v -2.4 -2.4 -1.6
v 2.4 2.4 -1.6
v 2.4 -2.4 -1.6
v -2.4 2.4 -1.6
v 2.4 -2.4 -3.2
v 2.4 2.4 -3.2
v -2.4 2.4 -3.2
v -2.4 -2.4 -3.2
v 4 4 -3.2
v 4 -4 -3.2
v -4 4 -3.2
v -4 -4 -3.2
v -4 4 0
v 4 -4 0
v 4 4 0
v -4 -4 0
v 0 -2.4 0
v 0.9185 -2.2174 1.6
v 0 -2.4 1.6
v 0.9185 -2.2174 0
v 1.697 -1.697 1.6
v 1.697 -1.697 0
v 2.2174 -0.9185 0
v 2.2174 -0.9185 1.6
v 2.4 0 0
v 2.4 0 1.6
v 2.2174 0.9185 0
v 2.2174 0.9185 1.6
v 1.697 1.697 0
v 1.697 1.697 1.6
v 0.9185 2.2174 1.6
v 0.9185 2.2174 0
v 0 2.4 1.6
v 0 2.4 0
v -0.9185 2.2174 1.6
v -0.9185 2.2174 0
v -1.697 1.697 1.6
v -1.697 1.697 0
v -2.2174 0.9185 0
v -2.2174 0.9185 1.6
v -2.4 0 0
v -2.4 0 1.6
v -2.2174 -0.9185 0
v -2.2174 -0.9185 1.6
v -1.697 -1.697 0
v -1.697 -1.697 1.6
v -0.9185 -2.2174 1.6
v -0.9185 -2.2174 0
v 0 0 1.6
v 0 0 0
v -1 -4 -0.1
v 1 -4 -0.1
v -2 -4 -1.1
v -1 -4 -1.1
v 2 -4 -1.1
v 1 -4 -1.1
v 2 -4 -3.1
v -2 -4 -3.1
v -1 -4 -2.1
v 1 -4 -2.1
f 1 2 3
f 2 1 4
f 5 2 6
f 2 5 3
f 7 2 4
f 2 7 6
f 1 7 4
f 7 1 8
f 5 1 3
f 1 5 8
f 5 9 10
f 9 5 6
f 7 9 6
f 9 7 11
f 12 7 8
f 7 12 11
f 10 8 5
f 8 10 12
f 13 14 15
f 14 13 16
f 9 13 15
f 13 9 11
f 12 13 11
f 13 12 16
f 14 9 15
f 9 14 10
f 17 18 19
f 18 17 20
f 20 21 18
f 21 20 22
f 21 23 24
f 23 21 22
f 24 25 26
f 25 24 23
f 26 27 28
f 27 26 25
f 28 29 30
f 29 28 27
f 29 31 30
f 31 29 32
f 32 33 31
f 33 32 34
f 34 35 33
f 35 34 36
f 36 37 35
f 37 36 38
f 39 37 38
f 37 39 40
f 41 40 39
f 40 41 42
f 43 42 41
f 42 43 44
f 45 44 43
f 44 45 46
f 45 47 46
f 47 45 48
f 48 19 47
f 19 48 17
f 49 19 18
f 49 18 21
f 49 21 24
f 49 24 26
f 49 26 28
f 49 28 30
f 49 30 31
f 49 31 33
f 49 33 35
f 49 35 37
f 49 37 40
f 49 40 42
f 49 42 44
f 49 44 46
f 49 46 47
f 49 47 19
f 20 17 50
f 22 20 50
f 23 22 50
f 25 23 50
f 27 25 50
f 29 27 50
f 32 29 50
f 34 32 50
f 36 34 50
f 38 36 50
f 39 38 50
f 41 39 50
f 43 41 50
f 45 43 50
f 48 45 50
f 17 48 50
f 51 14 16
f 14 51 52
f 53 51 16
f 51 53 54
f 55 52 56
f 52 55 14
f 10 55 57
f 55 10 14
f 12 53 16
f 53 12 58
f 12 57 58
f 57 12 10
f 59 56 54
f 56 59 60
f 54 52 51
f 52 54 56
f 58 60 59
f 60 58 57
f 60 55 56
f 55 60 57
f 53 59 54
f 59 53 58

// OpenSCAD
// file: ../p/4-4edge.scad
use <../lib.scad>
function ldraw_lib__4_4edge() = [
// 0 Circle 1.0
// 0 Name: 4-4edge.dat
// 0 Author: James Jessiman
// 0 !LDRAW_ORG Primitive UPDATE 2017-01
// 0 !LICENSE Licensed under CC BY 2.0 and CC BY 4.0 : see CAreadme.txt
// 
// 0 BFC CERTIFY CCW
  [0,"BFC","CERTIFY"],
  [0,"BFC","CCW"],
// 
// 0 !HISTORY 1998-12-15 [PTadmin] Official Update 1998-10
// 0 !HISTORY 2005-12-28 [PTadmin] Official Update 2005-01
// 0 !HISTORY 2007-06-24 [PTadmin] Header formatted for Contributor Agreement
// 0 !HISTORY 2008-07-01 [PTadmin] Official Update 2008-01
// 0 !HISTORY 2017-01-15 [Steffen] BFCed
// 0 !HISTORY 2017-12-30 [PTadmin] Official Update 2017-01
// 
// 
// 2 24 1 0 0 0.9239 0 0.3827
  [2,24,1,0,0,0.9239,0,0.3827],
// 2 24 0.9239 0 0.3827 0.7071 0 0.7071
  [2,24,0.9239,0,0.3827,0.7071,0,0.7071],
// 2 24 0.7071 0 0.7071 0.3827 0 0.9239
  [2,24,0.7071,0,0.7071,0.3827,0,0.9239],
// 2 24 0.3827 0 0.9239 0 0 1
  [2,24,0.3827,0,0.9239,0,0,1],
// 2 24 0 0 1 -0.3827 0 0.9239
  [2,24,0,0,1,-0.3827,0,0.9239],
// 2 24 -0.3827 0 0.9239 -0.7071 0 0.7071
  [2,24,-0.3827,0,0.9239,-0.7071,0,0.7071],
// 2 24 -0.7071 0 0.7071 -0.9239 0 0.3827
  [2,24,-0.7071,0,0.7071,-0.9239,0,0.3827],
// 2 24 -0.9239 0 0.3827 -1 0 -0
  [2,24,-0.9239,0,0.3827,-1,0,-0],
// 2 24 -1 0 -0 -0.9239 0 -0.3827
  [2,24,-1,0,-0,-0.9239,0,-0.3827],
// 2 24 -0.9239 0 -0.3827 -0.7071 0 -0.7071
  [2,24,-0.9239,0,-0.3827,-0.7071,0,-0.7071],
// 2 24 -0.7071 0 -0.7071 -0.3827 0 -0.9239
  [2,24,-0.7071,0,-0.7071,-0.3827,0,-0.9239],
// 2 24 -0.3827 0 -0.9239 0 0 -1
  [2,24,-0.3827,0,-0.9239,0,0,-1],
// 2 24 0 0 -1 0.3827 0 -0.9239
  [2,24,0,0,-1,0.3827,0,-0.9239],
// 2 24 0.3827 0 -0.9239 0.7071 0 -0.7071
  [2,24,0.3827,0,-0.9239,0.7071,0,-0.7071],
// 2 24 0.7071 0 -0.7071 0.9239 0 -0.3827
  [2,24,0.7071,0,-0.7071,0.9239,0,-0.3827],
// 2 24 0.9239 0 -0.3827 1 0 0
  [2,24,0.9239,0,-0.3827,1,0,0],
];
module ldraw_lib__4_4edge(step=0, col=false, unit=2/5, alt=false, line=0.2, solid=!$preview)
    makepoly(ldraw_lib__4_4edge(), step=step, col=col, unit=unit, alt=alt, line=line, solid=solid);
ldraw_lib__4_4edge(line=0.2);
// file: ../p/4-4disc.scad
use <../lib.scad>
function ldraw_lib__4_4disc() = [
// 0 Disc 1.0
// 0 Name: 4-4disc.dat
// 0 Author: James Jessiman
// 0 !LDRAW_ORG Primitive UPDATE 2002-02
// 0 !LICENSE Licensed under CC BY 2.0 and CC BY 4.0 : see CAreadme.txt
// 
// 0 BFC CERTIFY CCW
  [0,"BFC","CERTIFY"],
  [0,"BFC","CCW"],
// 
// 0 !HISTORY 1998-12-15 [PTadmin] Official Update 1998-10
// 0 !HISTORY 2002-03-23 [sbliss] Added BFC statement
// 0 !HISTORY 2002-04-25 [PTadmin] Official Update 2002-02
// 0 !HISTORY 2007-06-24 [PTadmin] Header formatted for Contributor Agreement
// 0 !HISTORY 2008-07-01 [PTadmin] Official Update 2008-01
// 
// 
// 3 16 0 0 0 1 0 0 0.9239 0 0.3827
  [3,16,0,0,0,1,0,0,0.9239,0,0.3827],
// 3 16 0 0 0 0.9239 0 0.3827 0.7071 0 0.7071
  [3,16,0,0,0,0.9239,0,0.3827,0.7071,0,0.7071],
// 3 16 0 0 0 0.7071 0 0.7071 0.3827 0 0.9239
  [3,16,0,0,0,0.7071,0,0.7071,0.3827,0,0.9239],
// 3 16 0 0 0 0.3827 0 0.9239 0 0 1
  [3,16,0,0,0,0.3827,0,0.9239,0,0,1],
// 3 16 0 0 0 0 0 1 -0.3827 0 0.9239
  [3,16,0,0,0,0,0,1,-0.3827,0,0.9239],
// 3 16 0 0 0 -0.3827 0 0.9239 -0.7071 0 0.7071
  [3,16,0,0,0,-0.3827,0,0.9239,-0.7071,0,0.7071],
// 3 16 0 0 0 -0.7071 0 0.7071 -0.9239 0 0.3827
  [3,16,0,0,0,-0.7071,0,0.7071,-0.9239,0,0.3827],
// 3 16 0 0 0 -0.9239 0 0.3827 -1 0 -0
  [3,16,0,0,0,-0.9239,0,0.3827,-1,0,-0],
// 3 16 0 0 0 -1 0 -0 -0.9239 0 -0.3827
  [3,16,0,0,0,-1,0,-0,-0.9239,0,-0.3827],
// 3 16 0 0 0 -0.9239 0 -0.3827 -0.7071 0 -0.7071
  [3,16,0,0,0,-0.9239,0,-0.3827,-0.7071,0,-0.7071],
// 3 16 0 0 0 -0.7071 0 -0.7071 -0.3827 0 -0.9239
  [3,16,0,0,0,-0.7071,0,-0.7071,-0.3827,0,-0.9239],
// 3 16 0 0 0 -0.3827 0 -0.9239 0 0 -1
  [3,16,0,0,0,-0.3827,0,-0.9239,0,0,-1],
// 3 16 0 0 0 0 0 -1 0.3827 0 -0.9239
  [3,16,0,0,0,0,0,-1,0.3827,0,-0.9239],
// 3 16 0 0 0 0.3827 0 -0.9239 0.7071 0 -0.7071
  [3,16,0,0,0,0.3827,0,-0.9239,0.7071,0,-0.7071],
// 3 16 0 0 0 0.7071 0 -0.7071 0.9239 0 -0.3827
  [3,16,0,0,0,0.7071,0,-0.7071,0.9239,0,-0.3827],
// 3 16 0 0 0 0.9239 0 -0.3827 1 0 0
  [3,16,0,0,0,0.9239,0,-0.3827,1,0,0],
// 0
];
module ldraw_lib__4_4disc(step=0, col=false, unit=2/5, alt=false, line=0.2, solid=!$preview)
    makepoly(ldraw_lib__4_4disc(), step=step, col=col, unit=unit, alt=alt, line=line, solid=solid);
ldraw_lib__4_4disc(line=0.2);
// file: ../p/4-4cyli.scad
use <../lib.scad>
$fa=1; $fs=0.2;
function ldraw_lib__4_4cyli(realsolid=false) = [
// 0 Cylinder 1.0
// 0 Name: 4-4cyli.dat
// 0 Author: James Jessiman
// 0 !LDRAW_ORG Primitive UPDATE 2005-01
// 0 !LICENSE Licensed under CC BY 2.0 and CC BY 4.0 : see CAreadme.txt
// 
// 0 BFC CERTIFY CCW
  [0,"BFC","CERTIFY"],
  [0,"BFC","CCW"],
// 
// 0 !HISTORY 1998-12-15 [PTadmin] Official Update 1998-10
// 0 !HISTORY 2002-03-23 [sbliss] Added BFC statement; merged headers from files in distributions LDraw 0.27 and Complete.
// 0 !HISTORY 2002-04-25 [PTadmin] Official Update 2002-02
// 0 !HISTORY 2004-12-14 [guyvivan] BFC CCW
// 0 !HISTORY 2005-12-28 [PTadmin] Official Update 2005-01
// 0 !HISTORY 2007-06-24 [PTadmin] Header formatted for Contributor Agreement
// 0 !HISTORY 2008-07-01 [PTadmin] Official Update 2008-01
// 
// 
// 4 16 1 1 0 0.9239 1 0.3827 0.9239 0 0.3827 1 0 0
  [4,16,1,1,0,0.9239,1,0.3827,0.9239,0,0.3827,1,0,0],
// 5 24 1 0 0 1 1 0 0.9239 0 0.3827 0.9239 0 -0.3827
  [5,24,1,0,0,1,1,0,0.9239,0,0.3827,0.9239,0,-0.3827],
// 4 16 0.9239 1 0.3827 0.7071 1 0.7071 0.7071 0 0.7071 0.9239 0 0.3827
  [4,16,0.9239,1,0.3827,0.7071,1,0.7071,0.7071,0,0.7071,0.9239,0,0.3827],
// 5 24 0.9239 0 0.3827 0.9239 1 0.3827 0.7071 0 0.7071 1 0 0
  [5,24,0.9239,0,0.3827,0.9239,1,0.3827,0.7071,0,0.7071,1,0,0],
// 4 16 0.7071 1 0.7071 0.3827 1 0.9239 0.3827 0 0.9239 0.7071 0 0.7071
  [4,16,0.7071,1,0.7071,0.3827,1,0.9239,0.3827,0,0.9239,0.7071,0,0.7071],
// 5 24 0.7071 0 0.7071 0.7071 1 0.7071 0.3827 0 0.9239 0.9239 0 0.3827
  [5,24,0.7071,0,0.7071,0.7071,1,0.7071,0.3827,0,0.9239,0.9239,0,0.3827],
// 4 16 0.3827 1 0.9239 0 1 1 0 0 1 0.3827 0 0.9239
  [4,16,0.3827,1,0.9239,0,1,1,0,0,1,0.3827,0,0.9239],
// 5 24 0.3827 0 0.9239 0.3827 1 0.9239 0 0 1 0.7071 0 0.7071
  [5,24,0.3827,0,0.9239,0.3827,1,0.9239,0,0,1,0.7071,0,0.7071],
// 4 16 0 1 1 -0.3827 1 0.9239 -0.3827 0 0.9239 0 0 1
  [4,16,0,1,1,-0.3827,1,0.9239,-0.3827,0,0.9239,0,0,1],
// 5 24 0 0 1 0 1 1 -0.3827 0 0.9239 0.3827 0 0.9239
  [5,24,0,0,1,0,1,1,-0.3827,0,0.9239,0.3827,0,0.9239],
// 4 16 -0.3827 1 0.9239 -0.7071 1 0.7071 -0.7071 0 0.7071 -0.3827 0 0.9239
  [4,16,-0.3827,1,0.9239,-0.7071,1,0.7071,-0.7071,0,0.7071,-0.3827,0,0.9239],
// 5 24 -0.3827 0 0.9239 -0.3827 1 0.9239 -0.7071 0 0.7071 0 0 1
  [5,24,-0.3827,0,0.9239,-0.3827,1,0.9239,-0.7071,0,0.7071,0,0,1],
// 4 16 -0.7071 1 0.7071 -0.9239 1 0.3827 -0.9239 0 0.3827 -0.7071 0 0.7071
  [4,16,-0.7071,1,0.7071,-0.9239,1,0.3827,-0.9239,0,0.3827,-0.7071,0,0.7071],
// 5 24 -0.7071 0 0.7071 -0.7071 1 0.7071 -0.9239 0 0.3827 -0.3827 0 0.9239
  [5,24,-0.7071,0,0.7071,-0.7071,1,0.7071,-0.9239,0,0.3827,-0.3827,0,0.9239],
// 4 16 -0.9239 1 0.3827 -1 1 0 -1 0 0 -0.9239 0 0.3827
  [4,16,-0.9239,1,0.3827,-1,1,0,-1,0,0,-0.9239,0,0.3827],
// 5 24 -0.9239 0 0.3827 -0.9239 1 0.3827 -1 0 0 -0.7071 0 0.7071
  [5,24,-0.9239,0,0.3827,-0.9239,1,0.3827,-1,0,0,-0.7071,0,0.7071],
// 4 16 -1 1 0 -0.9239 1 -0.3827 -0.9239 0 -0.3827 -1 0 0
  [4,16,-1,1,0,-0.9239,1,-0.3827,-0.9239,0,-0.3827,-1,0,0],
// 5 24 -1 0 0 -1 1 0 -0.9239 0 -0.3827 -0.9239 0 0.3827
  [5,24,-1,0,0,-1,1,0,-0.9239,0,-0.3827,-0.9239,0,0.3827],
// 4 16 -0.9239 1 -0.3827 -0.7071 1 -0.7071 -0.7071 0 -0.7071 -0.9239 0 -0.3827
  [4,16,-0.9239,1,-0.3827,-0.7071,1,-0.7071,-0.7071,0,-0.7071,-0.9239,0,-0.3827],
// 5 24 -0.9239 0 -0.3827 -0.9239 1 -0.3827 -0.7071 0 -0.7071 -1 0 0
  [5,24,-0.9239,0,-0.3827,-0.9239,1,-0.3827,-0.7071,0,-0.7071,-1,0,0],
// 4 16 -0.7071 1 -0.7071 -0.3827 1 -0.9239 -0.3827 0 -0.9239 -0.7071 0 -0.7071
  [4,16,-0.7071,1,-0.7071,-0.3827,1,-0.9239,-0.3827,0,-0.9239,-0.7071,0,-0.7071],
// 5 24 -0.7071 0 -0.7071 -0.7071 1 -0.7071 -0.3827 0 -0.9239 -0.9239 0 -0.3827
  [5,24,-0.7071,0,-0.7071,-0.7071,1,-0.7071,-0.3827,0,-0.9239,-0.9239,0,-0.3827],
// 4 16 -0.3827 1 -0.9239 0 1 -1 0 0 -1 -0.3827 0 -0.9239
  [4,16,-0.3827,1,-0.9239,0,1,-1,0,0,-1,-0.3827,0,-0.9239],
// 5 24 -0.3827 0 -0.9239 -0.3827 1 -0.9239 0 0 -1 -0.7071 0 -0.7071
  [5,24,-0.3827,0,-0.9239,-0.3827,1,-0.9239,0,0,-1,-0.7071,0,-0.7071],
// 4 16 0 1 -1 0.3827 1 -0.9239 0.3827 0 -0.9239 0 0 -1
  [4,16,0,1,-1,0.3827,1,-0.9239,0.3827,0,-0.9239,0,0,-1],
// 5 24 0 0 -1 0 1 -1 0.3827 0 -0.9239 -0.3827 0 -0.9239
  [5,24,0,0,-1,0,1,-1,0.3827,0,-0.9239,-0.3827,0,-0.9239],
// 4 16 0.3827 1 -0.9239 0.7071 1 -0.7071 0.7071 0 -0.7071 0.3827 0 -0.9239
  [4,16,0.3827,1,-0.9239,0.7071,1,-0.7071,0.7071,0,-0.7071,0.3827,0,-0.9239],
// 5 24 0.3827 0 -0.9239 0.3827 1 -0.9239 0.7071 0 -0.7071 0 0 -1
  [5,24,0.3827,0,-0.9239,0.3827,1,-0.9239,0.7071,0,-0.7071,0,0,-1],
// 4 16 0.7071 1 -0.7071 0.9239 1 -0.3827 0.9239 0 -0.3827 0.7071 0 -0.7071
  [4,16,0.7071,1,-0.7071,0.9239,1,-0.3827,0.9239,0,-0.3827,0.7071,0,-0.7071],
// 5 24 0.7071 0 -0.7071 0.7071 1 -0.7071 0.9239 0 -0.3827 0.3827 0 -0.9239
  [5,24,0.7071,0,-0.7071,0.7071,1,-0.7071,0.9239,0,-0.3827,0.3827,0,-0.9239],
// 4 16 0.9239 1 -0.3827 1 1 0 1 0 0 0.9239 0 -0.3827
  [4,16,0.9239,1,-0.3827,1,1,0,1,0,0,0.9239,0,-0.3827],
// 5 24 0.9239 0 -0.3827 0.9239 1 -0.3827 1 0 0 0.7071 0 -0.7071
  [5,24,0.9239,0,-0.3827,0.9239,1,-0.3827,1,0,0,0.7071,0,-0.7071],
// 0
];
module ldraw_lib__4_4cyli(step=0, col=false, unit=2/5, alt=false, line=0.2, solid=!$preview)
    makepoly(ldraw_lib__4_4cyli(solid), step=step, col=col, unit=unit, alt=alt, line=line, solid=solid);
ldraw_lib__4_4cyli(line=0.2);
// file: ../p/stud.scad
use <../lib.scad>
use <4-4cyli.scad>
use <4-4disc.scad>
use <4-4edge.scad>
function ldraw_lib__stud() = [
// 0 Stud
// 0 Name: stud.dat
// 0 Author: James Jessiman
// 0 !LDRAW_ORG Primitive UPDATE 2012-01
// 0 !LICENSE Licensed under CC BY 4.0 : see CAreadme.txt
// 
// 0 BFC CERTIFY CCW
  [0,"BFC","CERTIFY"],
  [0,"BFC","CCW"],
// 
// 0 !HISTORY 2002-04-04 [sbliss] Modified for BFC compliance
// 0 !HISTORY 2002-04-25 [PTadmin] Official Update 2002-02
// 0 !HISTORY 2007-06-24 [PTadmin] Header formatted for Contributor Agreement
// 0 !HISTORY 2008-07-01 [PTadmin] Official Update 2008-01
// 0 !HISTORY 2012-02-16 [Philo] Changed to CCW
// 0 !HISTORY 2012-03-30 [PTadmin] Official Update 2012-01
// 
// 
// 1 16 0 0 0 6 0 0 0 1 0 0 0 6 4-4edge.dat
  [1,16,0,0,0,6,0,0,0,1,0,0,0,6, ldraw_lib__4_4edge()],
// 1 16 0 -4 0 6 0 0 0 1 0 0 0 6 4-4edge.dat
  [1,16,0,-4,0,6,0,0,0,1,0,0,0,6, ldraw_lib__4_4edge()],
// 1 16 0 0 0 6 0 0 0 -4 0 0 0 6 4-4cyli.dat
  [1,16,0,0,0,6,0,0,0,-4,0,0,0,6, ldraw_lib__4_4cyli()],
// 1 16 0 -4 0 6 0 0 0 1 0 0 0 6 4-4disc.dat
  [1,16,0,-4,0,6,0,0,0,1,0,0,0,6, ldraw_lib__4_4disc()],
  [-1,16,0,0,0,6,0,0,0,-1,0,0,0,6, ldraw_lib__4_4disc()],
];
module ldraw_lib__stud(step=0, col=false, unit=2/5, alt=false, line=0.2, solid=!$preview)
    makepoly(ldraw_lib__stud(), step=step, col=col, unit=unit, alt=alt, line=line, solid=solid);
ldraw_lib__stud(line=0.2);
// file: ../p/box5.scad
use <../lib.scad>
function ldraw_lib__box5() = [
// 0 Box with 5 Faces and All Edges
// 0 Name: box5.dat
// 0 Author: James Jessiman
// 0 !LDRAW_ORG Primitive UPDATE 2012-01
// 0 !LICENSE Licensed under CC BY 2.0 and CC BY 4.0 : see CAreadme.txt
// 
// 0 BFC CERTIFY CCW
  [0,"BFC","CERTIFY"],
  [0,"BFC","CCW"],
// 
// 0 !HISTORY 2002-04-03 [sbliss] Modified for BFC compliance
// 0 !HISTORY 2002-04-25 [PTadmin] Official Update 2002-02
// 0 !HISTORY 2007-06-24 [PTadmin] Header formatted for Contributor Agreement
// 0 !HISTORY 2008-07-01 [PTadmin] Official Update 2008-01
// 0 !HISTORY 2012-02-16 [Philo] Changed to CCW
// 0 !HISTORY 2012-03-30 [PTadmin] Official Update 2012-01
// 
// 
// 2 24 1 1 1 -1 1 1
  [2,24,1,1,1,-1,1,1],
// 2 24 -1 1 1 -1 1 -1
  [2,24,-1,1,1,-1,1,-1],
// 2 24 -1 1 -1 1 1 -1
  [2,24,-1,1,-1,1,1,-1],
// 2 24 1 1 -1 1 1 1
  [2,24,1,1,-1,1,1,1],
// 2 24 1 0 1 -1 0 1
  [2,24,1,0,1,-1,0,1],
// 2 24 -1 0 1 -1 0 -1
  [2,24,-1,0,1,-1,0,-1],
// 2 24 -1 0 -1 1 0 -1
  [2,24,-1,0,-1,1,0,-1],
// 2 24 1 0 -1 1 0 1
  [2,24,1,0,-1,1,0,1],
// 2 24 1 0 1 1 1 1
  [2,24,1,0,1,1,1,1],
// 2 24 -1 0 1 -1 1 1
  [2,24,-1,0,1,-1,1,1],
// 2 24 1 0 -1 1 1 -1
  [2,24,1,0,-1,1,1,-1],
// 2 24 -1 0 -1 -1 1 -1
  [2,24,-1,0,-1,-1,1,-1],
// 4 16 -1 1 1 1 1 1 1 1 -1 -1 1 -1
  [4,16,-1,1,1,1,1,1,1,1,-1,-1,1,-1],
// 4 16 -1 1 1 -1 0 1 1 0 1 1 1 1
  [4,16,-1,1,1,-1,0,1,1,0,1,1,1,1],
// 4 16 -1 1 -1 -1 0 -1 -1 0 1 -1 1 1
  [4,16,-1,1,-1,-1,0,-1,-1,0,1,-1,1,1],
// 4 16 1 1 -1 1 0 -1 -1 0 -1 -1 1 -1
  [4,16,1,1,-1,1,0,-1,-1,0,-1,-1,1,-1],
// 4 16 1 1 1 1 0 1 1 0 -1 1 1 -1
  [4,16,1,1,1,1,0,1,1,0,-1,1,1,-1],
];
makepoly(ldraw_lib__box5(), line=0.2);
// file: ../p/box4t.scad
use <../lib.scad>
function ldraw_lib__box4t() = [
// 0 Box with 4 Adjacent Faces and All Edges
// 0 Name: box4t.dat
// 0 Author: Tore Eriksson [Tore_Eriksson]
// 0 !LDRAW_ORG Primitive UPDATE 2003-02
// 0 !LICENSE Licensed under CC BY 2.0 and CC BY 4.0 : see CAreadme.txt
// 
// 0 BFC CERTIFY CCW
  [0,"BFC","CERTIFY"],
  [0,"BFC","CCW"],
// 
// 0 !HISTORY 1997-09-29 [PTadmin] Official Update 1997-15
// 0 !HISTORY 2002-08-31 [izanette] Modified with WINDZ for BFC compliance
// 0 !HISTORY 2003-08-01 [PTadmin] Official Update 2003-02
// 0 !HISTORY 2007-06-24 [PTadmin] Header formatted for Contributor Agreement
// 0 !HISTORY 2008-07-01 [PTadmin] Official Update 2008-01
// 
// 
// 2 24 1 1 1 -1 1 1
  [2,24,1,1,1,-1,1,1],
// 2 24 -1 1 1 -1 1 -1
  [2,24,-1,1,1,-1,1,-1],
// 2 24 -1 1 -1 1 1 -1
  [2,24,-1,1,-1,1,1,-1],
// 2 24 1 1 -1 1 1 1
  [2,24,1,1,-1,1,1,1],
// 2 24 1 0 1 -1 0 1
  [2,24,1,0,1,-1,0,1],
// 2 24 -1 0 1 -1 0 -1
  [2,24,-1,0,1,-1,0,-1],
// 2 24 -1 0 -1 1 0 -1
  [2,24,-1,0,-1,1,0,-1],
// 2 24 1 0 -1 1 0 1
  [2,24,1,0,-1,1,0,1],
// 2 24 1 0 1 1 1 1
  [2,24,1,0,1,1,1,1],
// 2 24 -1 0 1 -1 1 1
  [2,24,-1,0,1,-1,1,1],
// 2 24 1 0 -1 1 1 -1
  [2,24,1,0,-1,1,1,-1],
// 2 24 -1 0 -1 -1 1 -1
  [2,24,-1,0,-1,-1,1,-1],
// 4 16 1 1 1 1 1 -1 -1 1 -1 -1 1 1
  [4,16,1,1,1,1,1,-1,-1,1,-1,-1,1,1],
// 4 16 1 1 1 -1 1 1 -1 0 1 1 0 1
  [4,16,1,1,1,-1,1,1,-1,0,1,1,0,1],
// 4 16 -1 1 1 -1 1 -1 -1 0 -1 -1 0 1
  [4,16,-1,1,1,-1,1,-1,-1,0,-1,-1,0,1],
// 0 4 16 -1 1 -1 -1 0 -1 1 0 -1 1 1 -1
// 4 16 1 1 -1 1 1 1 1 0 1 1 0 -1
  [4,16,1,1,-1,1,1,1,1,0,1,1,0,-1],
// 0
];
makepoly(ldraw_lib__box4t(), line=0.2);
// file: s/3024s01.scad
use <../../lib.scad>
use <../../p/box4t.scad>
use <../../p/box5.scad>
use <../../p/stud.scad>
function ldraw_lib__s__3024s01() = [
// 0 ~Plate  1 x  1 without Front Face
// 0 Name: s\3024s01.dat
// 0 Author: Tore Eriksson [Tore_Eriksson]
// 0 !LDRAW_ORG Subpart UPDATE 2012-03
// 0 !LICENSE Licensed under CC BY 2.0 and CC BY 4.0 : see CAreadme.txt
// 
// 0 BFC CERTIFY CCW
  [0,"BFC","CERTIFY"],
  [0,"BFC","CCW"],
// 
// 0 !HISTORY 2012-12-28 [PTadmin] Official Update 2012-03
// 
// 
// 0 BFC INVERTNEXT
  [0,"BFC","INVERTNEXT"],
// 1 16 0 8 0 0 0 6 0 -4 0 -6 0 0 box5.dat
  [1,16,0,8,0,0,0,6,0,-4,0,-6,0,0, ldraw_lib__box5()],
// 4 16 10 8 -10 6 8 -6 6 8 6 10 8 10
  [4,16,10,8,-10,6,8,-6,6,8,6,10,8,10],
// 4 16 10 8 10 6 8 6 -6 8 6 -10 8 10
  [4,16,10,8,10,6,8,6,-6,8,6,-10,8,10],
// 4 16 -10 8 10 -6 8 6 -6 8 -6 -10 8 -10
  [4,16,-10,8,10,-6,8,6,-6,8,-6,-10,8,-10],
// 4 16 -10 8 -10 -6 8 -6 6 8 -6 10 8 -10
  [4,16,-10,8,-10,-6,8,-6,6,8,-6,10,8,-10],
// 1 16 0 8 0 10 0 0 0 -8 0 0 0 10 box4t.dat
  [1,16,0,8,0,10,0,0,0,-8,0,0,0,10, ldraw_lib__box4t()],
// 1 16 0 0 0 0 0 1 0 1 0 -1 0 0 stud.dat
  [1,16,0,0,0,0,0,1,0,1,0,-1,0,0, ldraw_lib__stud()],
];
module ldraw_lib__s__3024s01(step=0, col=false, unit=2/5, alt=false, line=0.2, solid=!$preview)
    makepoly(ldraw_lib__s__3024s01(), step=step, col=col, unit=unit, alt=alt, line=line, solid=solid);
ldraw_lib__s__3024s01(line=0.2);
// main file
use <../lib.scad>
use <s/3024s01.scad>
function ldraw_lib__3024ptc3() = [
// 0 Plate  1 x  1 with Minecraft Micro Mob Steve Nose/Mouth Pattern
// 0 Name: 3024ptc3.dat
// 0 Author: Tore Eriksson [Tore_Eriksson]
// 0 !LDRAW_ORG Part UPDATE 2014-01
// 0 !LICENSE Licensed under CC BY 4.0 : see CAreadme.txt
// 
// 0 BFC CERTIFY CCW
  [0,"BFC","CERTIFY"],
  [0,"BFC","CCW"],
// 
// 0 !KEYWORDS BrickLink 3024pb002, Rebrickable 3024pr0004
// 
// 0 !CMDLINE -c19
// 
// 0 !HISTORY 2012-12-28 [PTadmin] Official Update 2012-03
// 0 !HISTORY 2013-12-29 [Philo] Corrected colors
// 0 !HISTORY 2014-06-21 [PTadmin] Official Update 2014-01
// 
// 
// 1 16 0 0 0 1 0 0 0 1 0 0 0 1 s\3024s01.dat
  [1,16,0,0,0,1,0,0,0,1,0,0,0,1, ldraw_lib__s__3024s01()],
// 4 16 10 0 -10 -10 0 -10 -2.5 0.25 -10 2.5 0.25 -10
  [4,16,10,0,-10,-10,0,-10,-2.5,0.25,-10,2.5,0.25,-10],
// 4 16 -10 0 -10 -5 2.75 -10 -2.5 2.75 -10 -2.5 0.25 -10
  [4,16,-10,0,-10,-5,2.75,-10,-2.5,2.75,-10,-2.5,0.25,-10],
// 4 16 10 0 -10 2.5 0.25 -10 2.5 2.75 -10 5 2.75 -10
  [4,16,10,0,-10,2.5,0.25,-10,2.5,2.75,-10,5,2.75,-10],
// 4 16 10 0 -10 5 2.75 -10 5 7.75 -10 10 8 -10
  [4,16,10,0,-10,5,2.75,-10,5,7.75,-10,10,8,-10],
// 4 16 -10 0 -10 -10 8 -10 -5 7.75 -10 -5 2.75 -10
  [4,16,-10,0,-10,-10,8,-10,-5,7.75,-10,-5,2.75,-10],
// 4 16 -10 8 -10 10 8 -10 5 7.75 -10 -5 7.75 -10
  [4,16,-10,8,-10,10,8,-10,5,7.75,-10,-5,7.75,-10],
// 4 16 2.5 5.25 -10 2.5 2.75 -10 -2.5 2.75 -10 -2.5 5.25 -10
  [4,16,2.5,5.25,-10,2.5,2.75,-10,-2.5,2.75,-10,-2.5,5.25,-10],
// 4 86 -2.5 0.25 -10 -2.5 2.75 -10 2.5 2.75 -10 2.5 0.25 -10
  [4,86,-2.5,0.25,-10,-2.5,2.75,-10,2.5,2.75,-10,2.5,0.25,-10],
// 4 308 -2.5 5.25 -10 -5 7.75 -10 5 7.75 -10 2.5 5.25 -10
  [4,308,-2.5,5.25,-10,-5,7.75,-10,5,7.75,-10,2.5,5.25,-10],
// 4 308 5 7.75 -10 5 2.75 -10 2.5 2.75 -10 2.5 5.25 -10
  [4,308,5,7.75,-10,5,2.75,-10,2.5,2.75,-10,2.5,5.25,-10],
// 4 308 -2.5 5.25 -10 -2.5 2.75 -10 -5 2.75 -10 -5 7.75 -10
  [4,308,-2.5,5.25,-10,-2.5,2.75,-10,-5,2.75,-10,-5,7.75,-10],
];
module ldraw_lib__3024ptc3(step=0, col=false, unit=2/5, alt=false, line=0.2, solid=!$preview)
    makepoly(ldraw_lib__3024ptc3(), step=step, col=col, unit=unit, alt=alt, line=line, solid=solid);
ldraw_lib__3024ptc3(line=0.2);
